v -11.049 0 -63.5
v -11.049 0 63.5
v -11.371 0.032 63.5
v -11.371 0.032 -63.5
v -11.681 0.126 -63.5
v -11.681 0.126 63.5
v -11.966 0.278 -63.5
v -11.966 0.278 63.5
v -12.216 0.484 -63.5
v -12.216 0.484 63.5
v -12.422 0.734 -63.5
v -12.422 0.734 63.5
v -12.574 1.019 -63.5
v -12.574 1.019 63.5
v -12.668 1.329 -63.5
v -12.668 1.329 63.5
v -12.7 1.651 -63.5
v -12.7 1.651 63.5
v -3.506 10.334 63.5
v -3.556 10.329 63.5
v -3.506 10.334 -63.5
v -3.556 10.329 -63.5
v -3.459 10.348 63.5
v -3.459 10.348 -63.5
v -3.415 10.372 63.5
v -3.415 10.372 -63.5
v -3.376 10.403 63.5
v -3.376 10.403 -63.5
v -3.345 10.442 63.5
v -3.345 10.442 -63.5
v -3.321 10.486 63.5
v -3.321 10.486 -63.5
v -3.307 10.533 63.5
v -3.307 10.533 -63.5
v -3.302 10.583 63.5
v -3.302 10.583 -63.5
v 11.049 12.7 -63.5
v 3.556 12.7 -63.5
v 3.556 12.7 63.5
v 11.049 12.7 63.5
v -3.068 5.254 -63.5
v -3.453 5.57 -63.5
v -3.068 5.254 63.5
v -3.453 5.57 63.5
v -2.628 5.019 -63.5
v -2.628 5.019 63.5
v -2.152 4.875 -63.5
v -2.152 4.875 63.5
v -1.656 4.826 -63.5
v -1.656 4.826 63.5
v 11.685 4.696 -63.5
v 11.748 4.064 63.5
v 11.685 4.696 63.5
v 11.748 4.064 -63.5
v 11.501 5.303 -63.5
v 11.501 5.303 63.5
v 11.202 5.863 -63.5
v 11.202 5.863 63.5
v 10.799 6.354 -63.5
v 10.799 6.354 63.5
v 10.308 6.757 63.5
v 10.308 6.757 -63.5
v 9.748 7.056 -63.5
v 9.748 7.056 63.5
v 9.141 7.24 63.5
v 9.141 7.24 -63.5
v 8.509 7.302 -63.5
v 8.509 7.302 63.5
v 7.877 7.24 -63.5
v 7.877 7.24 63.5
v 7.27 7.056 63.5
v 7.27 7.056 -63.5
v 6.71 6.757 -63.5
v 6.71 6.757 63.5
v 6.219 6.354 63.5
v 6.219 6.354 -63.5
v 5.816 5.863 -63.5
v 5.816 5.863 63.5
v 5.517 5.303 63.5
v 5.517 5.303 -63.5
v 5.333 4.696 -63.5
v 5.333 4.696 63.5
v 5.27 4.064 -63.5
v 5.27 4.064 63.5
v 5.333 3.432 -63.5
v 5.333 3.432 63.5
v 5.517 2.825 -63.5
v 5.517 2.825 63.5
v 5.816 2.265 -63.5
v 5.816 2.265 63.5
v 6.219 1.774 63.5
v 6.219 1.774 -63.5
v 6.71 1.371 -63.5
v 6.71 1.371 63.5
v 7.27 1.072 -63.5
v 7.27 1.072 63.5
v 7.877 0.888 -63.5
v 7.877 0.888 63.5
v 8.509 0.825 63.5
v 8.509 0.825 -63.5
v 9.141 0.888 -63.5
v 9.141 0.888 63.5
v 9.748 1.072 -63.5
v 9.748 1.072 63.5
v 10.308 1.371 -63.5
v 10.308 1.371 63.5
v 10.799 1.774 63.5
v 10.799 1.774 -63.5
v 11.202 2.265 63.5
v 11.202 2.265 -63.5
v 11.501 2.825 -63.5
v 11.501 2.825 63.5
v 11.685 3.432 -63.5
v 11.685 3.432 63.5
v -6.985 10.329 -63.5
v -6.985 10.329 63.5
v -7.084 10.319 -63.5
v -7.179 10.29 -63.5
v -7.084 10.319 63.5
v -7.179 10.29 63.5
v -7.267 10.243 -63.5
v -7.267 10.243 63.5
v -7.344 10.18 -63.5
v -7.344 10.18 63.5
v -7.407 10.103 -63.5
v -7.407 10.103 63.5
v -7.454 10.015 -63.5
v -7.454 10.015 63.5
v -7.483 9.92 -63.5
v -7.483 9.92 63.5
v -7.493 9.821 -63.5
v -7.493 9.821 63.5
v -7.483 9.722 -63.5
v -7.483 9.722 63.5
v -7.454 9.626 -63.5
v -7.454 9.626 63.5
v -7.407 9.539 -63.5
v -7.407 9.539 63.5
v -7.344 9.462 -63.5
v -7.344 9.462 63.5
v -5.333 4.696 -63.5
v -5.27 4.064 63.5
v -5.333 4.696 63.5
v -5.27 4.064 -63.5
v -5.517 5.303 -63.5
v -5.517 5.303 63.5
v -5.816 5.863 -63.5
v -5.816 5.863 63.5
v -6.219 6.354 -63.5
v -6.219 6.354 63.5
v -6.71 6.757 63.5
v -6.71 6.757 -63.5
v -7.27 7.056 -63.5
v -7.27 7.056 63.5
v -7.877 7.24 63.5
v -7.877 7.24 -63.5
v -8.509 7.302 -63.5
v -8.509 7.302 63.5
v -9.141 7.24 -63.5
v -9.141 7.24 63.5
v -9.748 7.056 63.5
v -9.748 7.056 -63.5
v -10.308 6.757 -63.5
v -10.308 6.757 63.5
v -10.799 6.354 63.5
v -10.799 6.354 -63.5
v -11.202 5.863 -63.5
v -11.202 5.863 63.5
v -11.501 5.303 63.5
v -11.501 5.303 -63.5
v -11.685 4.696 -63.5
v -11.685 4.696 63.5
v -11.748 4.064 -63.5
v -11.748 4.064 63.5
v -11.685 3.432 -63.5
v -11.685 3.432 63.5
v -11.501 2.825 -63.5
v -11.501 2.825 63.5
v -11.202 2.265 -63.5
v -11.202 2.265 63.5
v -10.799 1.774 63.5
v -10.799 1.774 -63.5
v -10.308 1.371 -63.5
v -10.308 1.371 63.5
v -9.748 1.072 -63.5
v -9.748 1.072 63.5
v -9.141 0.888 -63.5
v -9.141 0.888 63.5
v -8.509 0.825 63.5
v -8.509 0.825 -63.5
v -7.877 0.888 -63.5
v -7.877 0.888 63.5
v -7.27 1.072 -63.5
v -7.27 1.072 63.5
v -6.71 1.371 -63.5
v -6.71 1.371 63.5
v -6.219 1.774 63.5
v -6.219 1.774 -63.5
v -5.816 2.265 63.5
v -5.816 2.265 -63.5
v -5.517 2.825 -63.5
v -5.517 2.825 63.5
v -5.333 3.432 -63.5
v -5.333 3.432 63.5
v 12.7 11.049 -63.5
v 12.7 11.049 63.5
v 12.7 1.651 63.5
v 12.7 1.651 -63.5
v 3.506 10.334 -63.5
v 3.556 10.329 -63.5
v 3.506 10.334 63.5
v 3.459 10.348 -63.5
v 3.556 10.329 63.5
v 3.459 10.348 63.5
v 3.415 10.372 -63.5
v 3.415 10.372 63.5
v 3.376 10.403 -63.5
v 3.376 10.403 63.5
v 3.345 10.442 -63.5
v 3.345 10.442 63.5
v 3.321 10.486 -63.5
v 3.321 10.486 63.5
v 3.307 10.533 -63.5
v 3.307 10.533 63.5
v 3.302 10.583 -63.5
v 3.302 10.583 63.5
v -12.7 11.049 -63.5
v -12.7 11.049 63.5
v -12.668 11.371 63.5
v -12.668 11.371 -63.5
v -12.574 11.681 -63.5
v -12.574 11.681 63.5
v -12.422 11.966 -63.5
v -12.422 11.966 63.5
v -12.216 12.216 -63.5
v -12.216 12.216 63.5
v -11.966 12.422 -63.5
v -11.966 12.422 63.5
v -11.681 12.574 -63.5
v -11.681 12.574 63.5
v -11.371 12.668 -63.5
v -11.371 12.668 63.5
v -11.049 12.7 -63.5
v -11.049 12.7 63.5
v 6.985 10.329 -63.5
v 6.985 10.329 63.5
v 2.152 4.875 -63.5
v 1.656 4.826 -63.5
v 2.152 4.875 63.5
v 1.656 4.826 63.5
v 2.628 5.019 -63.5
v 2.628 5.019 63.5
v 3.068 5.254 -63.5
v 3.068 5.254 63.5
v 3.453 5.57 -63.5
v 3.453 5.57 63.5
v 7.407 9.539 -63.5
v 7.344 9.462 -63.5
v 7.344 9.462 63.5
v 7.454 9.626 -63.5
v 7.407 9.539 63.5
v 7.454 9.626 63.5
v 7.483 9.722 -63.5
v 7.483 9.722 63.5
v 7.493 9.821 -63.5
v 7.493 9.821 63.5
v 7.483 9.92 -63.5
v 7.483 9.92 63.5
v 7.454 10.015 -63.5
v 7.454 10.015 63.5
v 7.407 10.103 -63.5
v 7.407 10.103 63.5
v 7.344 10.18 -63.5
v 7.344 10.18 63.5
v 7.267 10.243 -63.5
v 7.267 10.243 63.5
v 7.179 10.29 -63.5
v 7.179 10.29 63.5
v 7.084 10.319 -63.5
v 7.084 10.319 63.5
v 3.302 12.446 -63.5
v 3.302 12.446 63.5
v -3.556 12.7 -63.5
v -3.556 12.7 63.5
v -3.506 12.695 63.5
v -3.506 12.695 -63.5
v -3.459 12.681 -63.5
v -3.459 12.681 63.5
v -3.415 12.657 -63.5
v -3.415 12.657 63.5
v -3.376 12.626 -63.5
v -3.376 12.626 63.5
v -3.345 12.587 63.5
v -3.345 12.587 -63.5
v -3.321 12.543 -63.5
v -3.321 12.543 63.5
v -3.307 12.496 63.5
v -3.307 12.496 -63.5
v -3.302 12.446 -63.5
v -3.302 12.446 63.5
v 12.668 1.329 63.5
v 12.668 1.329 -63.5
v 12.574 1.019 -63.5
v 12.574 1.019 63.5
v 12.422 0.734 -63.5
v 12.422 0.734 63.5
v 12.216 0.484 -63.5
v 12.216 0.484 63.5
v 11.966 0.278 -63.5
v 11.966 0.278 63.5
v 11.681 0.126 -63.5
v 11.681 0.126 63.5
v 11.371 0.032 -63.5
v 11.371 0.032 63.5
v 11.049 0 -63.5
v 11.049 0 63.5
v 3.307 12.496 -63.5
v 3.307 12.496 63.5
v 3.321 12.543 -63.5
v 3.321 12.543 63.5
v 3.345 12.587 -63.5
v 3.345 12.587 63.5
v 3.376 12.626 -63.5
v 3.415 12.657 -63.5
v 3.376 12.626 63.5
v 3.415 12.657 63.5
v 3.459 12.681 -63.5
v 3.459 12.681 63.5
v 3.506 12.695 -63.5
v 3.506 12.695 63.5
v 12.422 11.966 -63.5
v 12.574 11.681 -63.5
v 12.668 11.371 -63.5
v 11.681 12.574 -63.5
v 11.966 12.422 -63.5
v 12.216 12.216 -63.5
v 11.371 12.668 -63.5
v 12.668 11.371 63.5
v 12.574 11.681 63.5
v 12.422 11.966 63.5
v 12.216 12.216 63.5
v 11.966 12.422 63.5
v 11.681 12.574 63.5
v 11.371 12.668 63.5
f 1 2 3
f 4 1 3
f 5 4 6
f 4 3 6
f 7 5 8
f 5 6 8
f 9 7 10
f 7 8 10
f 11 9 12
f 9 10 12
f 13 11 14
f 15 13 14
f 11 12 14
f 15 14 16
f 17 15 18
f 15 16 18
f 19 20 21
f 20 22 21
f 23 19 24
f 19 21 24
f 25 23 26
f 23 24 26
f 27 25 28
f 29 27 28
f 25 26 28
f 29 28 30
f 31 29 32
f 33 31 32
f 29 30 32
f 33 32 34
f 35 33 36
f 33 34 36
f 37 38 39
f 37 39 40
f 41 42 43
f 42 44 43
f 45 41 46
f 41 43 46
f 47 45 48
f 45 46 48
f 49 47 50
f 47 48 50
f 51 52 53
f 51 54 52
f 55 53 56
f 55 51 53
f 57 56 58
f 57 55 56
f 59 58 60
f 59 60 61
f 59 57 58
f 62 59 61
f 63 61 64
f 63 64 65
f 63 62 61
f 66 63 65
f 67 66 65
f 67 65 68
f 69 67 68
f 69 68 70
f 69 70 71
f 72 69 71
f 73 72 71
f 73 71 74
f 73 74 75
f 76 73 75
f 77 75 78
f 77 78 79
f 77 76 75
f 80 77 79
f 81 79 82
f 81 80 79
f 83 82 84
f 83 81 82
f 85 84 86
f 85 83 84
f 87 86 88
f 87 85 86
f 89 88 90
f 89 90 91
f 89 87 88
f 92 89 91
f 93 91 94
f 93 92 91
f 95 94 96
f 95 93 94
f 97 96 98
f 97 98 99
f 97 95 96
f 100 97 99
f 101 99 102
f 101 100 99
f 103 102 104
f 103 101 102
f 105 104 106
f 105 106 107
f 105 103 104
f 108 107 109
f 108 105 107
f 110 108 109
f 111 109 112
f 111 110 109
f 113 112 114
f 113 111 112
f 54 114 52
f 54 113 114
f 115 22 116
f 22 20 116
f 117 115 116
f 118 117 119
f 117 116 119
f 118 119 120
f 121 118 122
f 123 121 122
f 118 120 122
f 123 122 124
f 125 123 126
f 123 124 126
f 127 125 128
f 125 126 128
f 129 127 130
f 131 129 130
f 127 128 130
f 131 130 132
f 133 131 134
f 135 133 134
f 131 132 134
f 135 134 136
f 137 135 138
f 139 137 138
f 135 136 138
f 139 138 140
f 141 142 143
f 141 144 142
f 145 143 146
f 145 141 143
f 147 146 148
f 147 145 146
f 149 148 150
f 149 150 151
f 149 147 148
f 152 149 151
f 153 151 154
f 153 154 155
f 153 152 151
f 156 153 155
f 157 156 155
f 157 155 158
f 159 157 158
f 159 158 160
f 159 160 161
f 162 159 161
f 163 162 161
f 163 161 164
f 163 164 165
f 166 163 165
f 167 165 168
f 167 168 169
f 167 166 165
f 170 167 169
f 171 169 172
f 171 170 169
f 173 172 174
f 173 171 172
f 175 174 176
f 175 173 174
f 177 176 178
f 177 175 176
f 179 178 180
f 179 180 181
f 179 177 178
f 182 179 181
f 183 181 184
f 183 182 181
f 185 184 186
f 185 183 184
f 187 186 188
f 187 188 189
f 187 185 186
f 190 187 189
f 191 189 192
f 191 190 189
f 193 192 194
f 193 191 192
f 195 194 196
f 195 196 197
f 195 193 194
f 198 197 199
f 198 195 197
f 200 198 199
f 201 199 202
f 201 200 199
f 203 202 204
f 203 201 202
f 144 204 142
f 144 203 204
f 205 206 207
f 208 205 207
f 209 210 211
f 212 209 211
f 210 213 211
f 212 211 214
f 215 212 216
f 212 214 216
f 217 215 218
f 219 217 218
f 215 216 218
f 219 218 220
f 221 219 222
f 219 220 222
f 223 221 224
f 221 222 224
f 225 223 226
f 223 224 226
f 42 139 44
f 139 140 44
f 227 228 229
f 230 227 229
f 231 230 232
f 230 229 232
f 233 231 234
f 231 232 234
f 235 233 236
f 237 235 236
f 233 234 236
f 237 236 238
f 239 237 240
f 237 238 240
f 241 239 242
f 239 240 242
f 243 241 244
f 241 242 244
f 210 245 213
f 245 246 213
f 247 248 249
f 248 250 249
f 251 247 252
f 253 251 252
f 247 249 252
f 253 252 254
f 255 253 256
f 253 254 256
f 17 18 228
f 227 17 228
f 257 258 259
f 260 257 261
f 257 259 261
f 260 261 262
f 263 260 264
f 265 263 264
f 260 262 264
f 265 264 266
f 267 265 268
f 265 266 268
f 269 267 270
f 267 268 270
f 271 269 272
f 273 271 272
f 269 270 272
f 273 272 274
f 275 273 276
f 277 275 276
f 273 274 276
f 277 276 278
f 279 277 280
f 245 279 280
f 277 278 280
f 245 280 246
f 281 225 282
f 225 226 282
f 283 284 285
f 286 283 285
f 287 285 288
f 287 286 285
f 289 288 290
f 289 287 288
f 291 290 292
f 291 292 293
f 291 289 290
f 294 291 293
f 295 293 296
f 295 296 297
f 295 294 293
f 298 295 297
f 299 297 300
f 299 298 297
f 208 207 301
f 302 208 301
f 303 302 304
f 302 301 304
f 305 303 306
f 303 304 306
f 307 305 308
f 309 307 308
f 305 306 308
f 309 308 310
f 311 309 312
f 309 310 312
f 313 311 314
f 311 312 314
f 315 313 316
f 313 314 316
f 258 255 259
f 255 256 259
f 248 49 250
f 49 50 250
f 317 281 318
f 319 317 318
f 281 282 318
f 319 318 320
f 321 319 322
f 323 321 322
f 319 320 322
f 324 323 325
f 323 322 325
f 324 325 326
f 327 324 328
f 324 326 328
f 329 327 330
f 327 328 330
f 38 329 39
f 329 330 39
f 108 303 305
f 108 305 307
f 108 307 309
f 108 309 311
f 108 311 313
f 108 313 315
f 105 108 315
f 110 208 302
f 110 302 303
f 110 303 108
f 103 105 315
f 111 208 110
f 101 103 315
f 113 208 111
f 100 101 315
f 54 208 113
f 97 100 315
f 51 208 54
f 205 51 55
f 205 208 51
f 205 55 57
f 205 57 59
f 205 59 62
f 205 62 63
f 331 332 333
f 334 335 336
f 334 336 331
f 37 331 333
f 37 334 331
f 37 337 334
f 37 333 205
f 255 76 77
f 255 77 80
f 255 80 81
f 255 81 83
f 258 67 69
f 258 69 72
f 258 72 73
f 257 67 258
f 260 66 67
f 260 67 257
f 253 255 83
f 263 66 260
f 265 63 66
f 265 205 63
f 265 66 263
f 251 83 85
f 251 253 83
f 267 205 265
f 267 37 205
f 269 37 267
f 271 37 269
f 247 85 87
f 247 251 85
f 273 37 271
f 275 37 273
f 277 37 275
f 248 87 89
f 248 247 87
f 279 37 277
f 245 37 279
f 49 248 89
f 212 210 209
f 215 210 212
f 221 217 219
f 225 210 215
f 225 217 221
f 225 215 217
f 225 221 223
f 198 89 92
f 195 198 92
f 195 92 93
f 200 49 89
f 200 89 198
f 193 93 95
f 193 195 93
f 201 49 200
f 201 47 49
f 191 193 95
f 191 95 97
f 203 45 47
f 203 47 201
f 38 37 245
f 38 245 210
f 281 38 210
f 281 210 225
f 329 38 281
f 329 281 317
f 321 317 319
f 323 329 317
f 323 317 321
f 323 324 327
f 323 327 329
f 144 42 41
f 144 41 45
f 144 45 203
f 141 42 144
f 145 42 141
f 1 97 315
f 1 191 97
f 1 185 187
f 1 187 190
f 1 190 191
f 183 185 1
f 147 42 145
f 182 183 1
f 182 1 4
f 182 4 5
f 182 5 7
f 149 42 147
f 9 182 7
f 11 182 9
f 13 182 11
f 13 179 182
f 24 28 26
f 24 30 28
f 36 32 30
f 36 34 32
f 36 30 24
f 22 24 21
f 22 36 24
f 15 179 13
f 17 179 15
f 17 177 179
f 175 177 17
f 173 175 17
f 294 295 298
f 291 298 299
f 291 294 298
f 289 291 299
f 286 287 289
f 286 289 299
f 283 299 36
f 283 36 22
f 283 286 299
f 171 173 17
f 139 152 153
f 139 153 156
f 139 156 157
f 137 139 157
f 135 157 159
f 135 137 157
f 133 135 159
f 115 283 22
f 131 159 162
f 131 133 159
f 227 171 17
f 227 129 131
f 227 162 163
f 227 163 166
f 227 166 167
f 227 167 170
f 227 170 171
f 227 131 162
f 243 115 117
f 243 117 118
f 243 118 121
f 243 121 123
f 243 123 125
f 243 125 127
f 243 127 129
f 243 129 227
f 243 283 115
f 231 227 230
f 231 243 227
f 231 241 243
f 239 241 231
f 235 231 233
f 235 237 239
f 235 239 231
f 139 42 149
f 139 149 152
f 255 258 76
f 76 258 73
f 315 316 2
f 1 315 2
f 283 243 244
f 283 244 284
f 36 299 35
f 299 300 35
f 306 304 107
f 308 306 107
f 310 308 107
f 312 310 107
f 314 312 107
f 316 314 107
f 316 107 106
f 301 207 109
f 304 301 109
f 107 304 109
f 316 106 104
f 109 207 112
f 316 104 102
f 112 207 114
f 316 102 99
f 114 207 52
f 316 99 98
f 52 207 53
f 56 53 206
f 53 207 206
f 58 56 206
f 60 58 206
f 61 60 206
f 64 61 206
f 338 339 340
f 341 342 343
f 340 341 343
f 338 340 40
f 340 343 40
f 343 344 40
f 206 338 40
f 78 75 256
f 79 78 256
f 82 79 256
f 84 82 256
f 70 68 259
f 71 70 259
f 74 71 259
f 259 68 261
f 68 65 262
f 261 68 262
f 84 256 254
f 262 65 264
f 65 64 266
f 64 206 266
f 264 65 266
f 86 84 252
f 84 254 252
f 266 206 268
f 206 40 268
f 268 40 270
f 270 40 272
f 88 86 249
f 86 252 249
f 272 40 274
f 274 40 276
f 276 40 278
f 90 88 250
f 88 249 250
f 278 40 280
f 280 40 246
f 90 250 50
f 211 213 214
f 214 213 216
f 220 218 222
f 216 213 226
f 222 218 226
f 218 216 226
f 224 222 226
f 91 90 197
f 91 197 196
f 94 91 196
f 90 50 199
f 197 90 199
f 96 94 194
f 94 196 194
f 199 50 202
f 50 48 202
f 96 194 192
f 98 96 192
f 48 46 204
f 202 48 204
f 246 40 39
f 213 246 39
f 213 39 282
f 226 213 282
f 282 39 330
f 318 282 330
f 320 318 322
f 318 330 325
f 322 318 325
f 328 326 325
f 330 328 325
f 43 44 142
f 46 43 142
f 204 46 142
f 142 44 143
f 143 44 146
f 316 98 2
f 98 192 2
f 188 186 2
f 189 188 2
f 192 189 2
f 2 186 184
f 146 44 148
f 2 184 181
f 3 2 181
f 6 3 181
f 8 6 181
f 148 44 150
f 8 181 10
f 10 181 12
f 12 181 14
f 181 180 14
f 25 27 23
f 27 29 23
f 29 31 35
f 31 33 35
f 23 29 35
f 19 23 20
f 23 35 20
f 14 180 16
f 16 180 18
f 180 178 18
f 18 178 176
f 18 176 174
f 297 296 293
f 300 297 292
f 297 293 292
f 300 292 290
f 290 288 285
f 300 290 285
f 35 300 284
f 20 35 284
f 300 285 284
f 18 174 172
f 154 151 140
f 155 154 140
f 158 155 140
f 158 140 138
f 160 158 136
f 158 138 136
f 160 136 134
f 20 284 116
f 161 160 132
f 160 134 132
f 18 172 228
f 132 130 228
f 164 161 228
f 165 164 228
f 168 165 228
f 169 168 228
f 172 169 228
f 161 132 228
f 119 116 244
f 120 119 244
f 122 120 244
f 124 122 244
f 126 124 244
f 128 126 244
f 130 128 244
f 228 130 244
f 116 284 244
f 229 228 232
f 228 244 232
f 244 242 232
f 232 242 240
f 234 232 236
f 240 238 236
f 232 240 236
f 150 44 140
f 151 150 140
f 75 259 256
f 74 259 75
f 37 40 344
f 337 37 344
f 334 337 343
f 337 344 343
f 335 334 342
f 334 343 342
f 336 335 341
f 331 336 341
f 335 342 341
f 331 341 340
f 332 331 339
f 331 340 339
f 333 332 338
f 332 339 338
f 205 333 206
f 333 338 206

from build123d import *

# Parameters (mm, degrees)
SKETCH3_R           = 3.2385
BOSS_EXTRUDE1_DEPTH = 63.5
FILLET1_R           = 0.254


with BuildPart() as part:
    # Sketch3 → Boss-Extrude1 (new body, symmetric)
    with BuildSketch(Plane.XY):
        with BuildLine():
            Line((-11.049, 12.7), (-3.302, 12.7))
            Line((-3.302, 12.7), (-3.302, 10.328863887))
            Line((-3.302, 10.328863887), (-6.985, 10.328863887))
            ThreePointArc((-6.985, 10.328863887), (-7.454330803, 10.01526707), (-7.344210245, 9.461653642))
            Line((-7.344210245, 9.461653642), (-3.452505379, 5.569948776))
            ThreePointArc((-3.452505379, 5.569948776), (-2.628470073, 5.019345987), (-1.656454155, 4.826))
            Line((-1.656454155, 4.826), (1.656454155, 4.826))
            ThreePointArc((1.656454155, 4.826), (2.628470073, 5.019345987), (3.452505379, 5.569948776))
            Line((3.452505379, 5.569948776), (7.344210245, 9.461653642))
            ThreePointArc((7.344210245, 9.461653642), (7.454330803, 10.01526707), (6.985, 10.328863887))
            Line((6.985, 10.328863887), (3.302, 10.328863887))
            Line((3.302, 10.328863887), (3.302, 12.7))
            Line((3.302, 12.7), (11.049, 12.7))
            ThreePointArc((11.049, 12.7), (12.216433296, 12.216433296), (12.7, 11.049))
            Line((12.7, 11.049), (12.7, 1.651))
            ThreePointArc((12.7, 1.651), (12.216433296, 0.483566704), (11.049, 0))
            Line((11.049, 0), (-11.049, 0))
            ThreePointArc((-11.049, 0), (-12.216433296, 0.483566704), (-12.7, 1.651))
            Line((-12.7, 1.651), (-12.7, 11.049))
            ThreePointArc((-12.7, 11.049), (-12.216433296, 12.216433296), (-11.049, 12.7))
        make_face()
        with Locations((8.509, 4.064)):
            Circle(SKETCH3_R, mode=Mode.SUBTRACT)
        with Locations((-8.509, 4.064)):
            Circle(SKETCH3_R, mode=Mode.SUBTRACT)
    extrude(amount=BOSS_EXTRUDE1_DEPTH, both=True)

    # Fillet1
    fillet1_edges = [part.edges().sort_by_distance(p)[0] for p in [
        (-3.302, 12.7, 0),
        (-3.302, 10.328863887, 0),
        (3.302, 10.328863887, 0),
        (3.302, 12.7, 0),
    ]]
    fillet(fillet1_edges, radius=FILLET1_R)


solid = part.part
